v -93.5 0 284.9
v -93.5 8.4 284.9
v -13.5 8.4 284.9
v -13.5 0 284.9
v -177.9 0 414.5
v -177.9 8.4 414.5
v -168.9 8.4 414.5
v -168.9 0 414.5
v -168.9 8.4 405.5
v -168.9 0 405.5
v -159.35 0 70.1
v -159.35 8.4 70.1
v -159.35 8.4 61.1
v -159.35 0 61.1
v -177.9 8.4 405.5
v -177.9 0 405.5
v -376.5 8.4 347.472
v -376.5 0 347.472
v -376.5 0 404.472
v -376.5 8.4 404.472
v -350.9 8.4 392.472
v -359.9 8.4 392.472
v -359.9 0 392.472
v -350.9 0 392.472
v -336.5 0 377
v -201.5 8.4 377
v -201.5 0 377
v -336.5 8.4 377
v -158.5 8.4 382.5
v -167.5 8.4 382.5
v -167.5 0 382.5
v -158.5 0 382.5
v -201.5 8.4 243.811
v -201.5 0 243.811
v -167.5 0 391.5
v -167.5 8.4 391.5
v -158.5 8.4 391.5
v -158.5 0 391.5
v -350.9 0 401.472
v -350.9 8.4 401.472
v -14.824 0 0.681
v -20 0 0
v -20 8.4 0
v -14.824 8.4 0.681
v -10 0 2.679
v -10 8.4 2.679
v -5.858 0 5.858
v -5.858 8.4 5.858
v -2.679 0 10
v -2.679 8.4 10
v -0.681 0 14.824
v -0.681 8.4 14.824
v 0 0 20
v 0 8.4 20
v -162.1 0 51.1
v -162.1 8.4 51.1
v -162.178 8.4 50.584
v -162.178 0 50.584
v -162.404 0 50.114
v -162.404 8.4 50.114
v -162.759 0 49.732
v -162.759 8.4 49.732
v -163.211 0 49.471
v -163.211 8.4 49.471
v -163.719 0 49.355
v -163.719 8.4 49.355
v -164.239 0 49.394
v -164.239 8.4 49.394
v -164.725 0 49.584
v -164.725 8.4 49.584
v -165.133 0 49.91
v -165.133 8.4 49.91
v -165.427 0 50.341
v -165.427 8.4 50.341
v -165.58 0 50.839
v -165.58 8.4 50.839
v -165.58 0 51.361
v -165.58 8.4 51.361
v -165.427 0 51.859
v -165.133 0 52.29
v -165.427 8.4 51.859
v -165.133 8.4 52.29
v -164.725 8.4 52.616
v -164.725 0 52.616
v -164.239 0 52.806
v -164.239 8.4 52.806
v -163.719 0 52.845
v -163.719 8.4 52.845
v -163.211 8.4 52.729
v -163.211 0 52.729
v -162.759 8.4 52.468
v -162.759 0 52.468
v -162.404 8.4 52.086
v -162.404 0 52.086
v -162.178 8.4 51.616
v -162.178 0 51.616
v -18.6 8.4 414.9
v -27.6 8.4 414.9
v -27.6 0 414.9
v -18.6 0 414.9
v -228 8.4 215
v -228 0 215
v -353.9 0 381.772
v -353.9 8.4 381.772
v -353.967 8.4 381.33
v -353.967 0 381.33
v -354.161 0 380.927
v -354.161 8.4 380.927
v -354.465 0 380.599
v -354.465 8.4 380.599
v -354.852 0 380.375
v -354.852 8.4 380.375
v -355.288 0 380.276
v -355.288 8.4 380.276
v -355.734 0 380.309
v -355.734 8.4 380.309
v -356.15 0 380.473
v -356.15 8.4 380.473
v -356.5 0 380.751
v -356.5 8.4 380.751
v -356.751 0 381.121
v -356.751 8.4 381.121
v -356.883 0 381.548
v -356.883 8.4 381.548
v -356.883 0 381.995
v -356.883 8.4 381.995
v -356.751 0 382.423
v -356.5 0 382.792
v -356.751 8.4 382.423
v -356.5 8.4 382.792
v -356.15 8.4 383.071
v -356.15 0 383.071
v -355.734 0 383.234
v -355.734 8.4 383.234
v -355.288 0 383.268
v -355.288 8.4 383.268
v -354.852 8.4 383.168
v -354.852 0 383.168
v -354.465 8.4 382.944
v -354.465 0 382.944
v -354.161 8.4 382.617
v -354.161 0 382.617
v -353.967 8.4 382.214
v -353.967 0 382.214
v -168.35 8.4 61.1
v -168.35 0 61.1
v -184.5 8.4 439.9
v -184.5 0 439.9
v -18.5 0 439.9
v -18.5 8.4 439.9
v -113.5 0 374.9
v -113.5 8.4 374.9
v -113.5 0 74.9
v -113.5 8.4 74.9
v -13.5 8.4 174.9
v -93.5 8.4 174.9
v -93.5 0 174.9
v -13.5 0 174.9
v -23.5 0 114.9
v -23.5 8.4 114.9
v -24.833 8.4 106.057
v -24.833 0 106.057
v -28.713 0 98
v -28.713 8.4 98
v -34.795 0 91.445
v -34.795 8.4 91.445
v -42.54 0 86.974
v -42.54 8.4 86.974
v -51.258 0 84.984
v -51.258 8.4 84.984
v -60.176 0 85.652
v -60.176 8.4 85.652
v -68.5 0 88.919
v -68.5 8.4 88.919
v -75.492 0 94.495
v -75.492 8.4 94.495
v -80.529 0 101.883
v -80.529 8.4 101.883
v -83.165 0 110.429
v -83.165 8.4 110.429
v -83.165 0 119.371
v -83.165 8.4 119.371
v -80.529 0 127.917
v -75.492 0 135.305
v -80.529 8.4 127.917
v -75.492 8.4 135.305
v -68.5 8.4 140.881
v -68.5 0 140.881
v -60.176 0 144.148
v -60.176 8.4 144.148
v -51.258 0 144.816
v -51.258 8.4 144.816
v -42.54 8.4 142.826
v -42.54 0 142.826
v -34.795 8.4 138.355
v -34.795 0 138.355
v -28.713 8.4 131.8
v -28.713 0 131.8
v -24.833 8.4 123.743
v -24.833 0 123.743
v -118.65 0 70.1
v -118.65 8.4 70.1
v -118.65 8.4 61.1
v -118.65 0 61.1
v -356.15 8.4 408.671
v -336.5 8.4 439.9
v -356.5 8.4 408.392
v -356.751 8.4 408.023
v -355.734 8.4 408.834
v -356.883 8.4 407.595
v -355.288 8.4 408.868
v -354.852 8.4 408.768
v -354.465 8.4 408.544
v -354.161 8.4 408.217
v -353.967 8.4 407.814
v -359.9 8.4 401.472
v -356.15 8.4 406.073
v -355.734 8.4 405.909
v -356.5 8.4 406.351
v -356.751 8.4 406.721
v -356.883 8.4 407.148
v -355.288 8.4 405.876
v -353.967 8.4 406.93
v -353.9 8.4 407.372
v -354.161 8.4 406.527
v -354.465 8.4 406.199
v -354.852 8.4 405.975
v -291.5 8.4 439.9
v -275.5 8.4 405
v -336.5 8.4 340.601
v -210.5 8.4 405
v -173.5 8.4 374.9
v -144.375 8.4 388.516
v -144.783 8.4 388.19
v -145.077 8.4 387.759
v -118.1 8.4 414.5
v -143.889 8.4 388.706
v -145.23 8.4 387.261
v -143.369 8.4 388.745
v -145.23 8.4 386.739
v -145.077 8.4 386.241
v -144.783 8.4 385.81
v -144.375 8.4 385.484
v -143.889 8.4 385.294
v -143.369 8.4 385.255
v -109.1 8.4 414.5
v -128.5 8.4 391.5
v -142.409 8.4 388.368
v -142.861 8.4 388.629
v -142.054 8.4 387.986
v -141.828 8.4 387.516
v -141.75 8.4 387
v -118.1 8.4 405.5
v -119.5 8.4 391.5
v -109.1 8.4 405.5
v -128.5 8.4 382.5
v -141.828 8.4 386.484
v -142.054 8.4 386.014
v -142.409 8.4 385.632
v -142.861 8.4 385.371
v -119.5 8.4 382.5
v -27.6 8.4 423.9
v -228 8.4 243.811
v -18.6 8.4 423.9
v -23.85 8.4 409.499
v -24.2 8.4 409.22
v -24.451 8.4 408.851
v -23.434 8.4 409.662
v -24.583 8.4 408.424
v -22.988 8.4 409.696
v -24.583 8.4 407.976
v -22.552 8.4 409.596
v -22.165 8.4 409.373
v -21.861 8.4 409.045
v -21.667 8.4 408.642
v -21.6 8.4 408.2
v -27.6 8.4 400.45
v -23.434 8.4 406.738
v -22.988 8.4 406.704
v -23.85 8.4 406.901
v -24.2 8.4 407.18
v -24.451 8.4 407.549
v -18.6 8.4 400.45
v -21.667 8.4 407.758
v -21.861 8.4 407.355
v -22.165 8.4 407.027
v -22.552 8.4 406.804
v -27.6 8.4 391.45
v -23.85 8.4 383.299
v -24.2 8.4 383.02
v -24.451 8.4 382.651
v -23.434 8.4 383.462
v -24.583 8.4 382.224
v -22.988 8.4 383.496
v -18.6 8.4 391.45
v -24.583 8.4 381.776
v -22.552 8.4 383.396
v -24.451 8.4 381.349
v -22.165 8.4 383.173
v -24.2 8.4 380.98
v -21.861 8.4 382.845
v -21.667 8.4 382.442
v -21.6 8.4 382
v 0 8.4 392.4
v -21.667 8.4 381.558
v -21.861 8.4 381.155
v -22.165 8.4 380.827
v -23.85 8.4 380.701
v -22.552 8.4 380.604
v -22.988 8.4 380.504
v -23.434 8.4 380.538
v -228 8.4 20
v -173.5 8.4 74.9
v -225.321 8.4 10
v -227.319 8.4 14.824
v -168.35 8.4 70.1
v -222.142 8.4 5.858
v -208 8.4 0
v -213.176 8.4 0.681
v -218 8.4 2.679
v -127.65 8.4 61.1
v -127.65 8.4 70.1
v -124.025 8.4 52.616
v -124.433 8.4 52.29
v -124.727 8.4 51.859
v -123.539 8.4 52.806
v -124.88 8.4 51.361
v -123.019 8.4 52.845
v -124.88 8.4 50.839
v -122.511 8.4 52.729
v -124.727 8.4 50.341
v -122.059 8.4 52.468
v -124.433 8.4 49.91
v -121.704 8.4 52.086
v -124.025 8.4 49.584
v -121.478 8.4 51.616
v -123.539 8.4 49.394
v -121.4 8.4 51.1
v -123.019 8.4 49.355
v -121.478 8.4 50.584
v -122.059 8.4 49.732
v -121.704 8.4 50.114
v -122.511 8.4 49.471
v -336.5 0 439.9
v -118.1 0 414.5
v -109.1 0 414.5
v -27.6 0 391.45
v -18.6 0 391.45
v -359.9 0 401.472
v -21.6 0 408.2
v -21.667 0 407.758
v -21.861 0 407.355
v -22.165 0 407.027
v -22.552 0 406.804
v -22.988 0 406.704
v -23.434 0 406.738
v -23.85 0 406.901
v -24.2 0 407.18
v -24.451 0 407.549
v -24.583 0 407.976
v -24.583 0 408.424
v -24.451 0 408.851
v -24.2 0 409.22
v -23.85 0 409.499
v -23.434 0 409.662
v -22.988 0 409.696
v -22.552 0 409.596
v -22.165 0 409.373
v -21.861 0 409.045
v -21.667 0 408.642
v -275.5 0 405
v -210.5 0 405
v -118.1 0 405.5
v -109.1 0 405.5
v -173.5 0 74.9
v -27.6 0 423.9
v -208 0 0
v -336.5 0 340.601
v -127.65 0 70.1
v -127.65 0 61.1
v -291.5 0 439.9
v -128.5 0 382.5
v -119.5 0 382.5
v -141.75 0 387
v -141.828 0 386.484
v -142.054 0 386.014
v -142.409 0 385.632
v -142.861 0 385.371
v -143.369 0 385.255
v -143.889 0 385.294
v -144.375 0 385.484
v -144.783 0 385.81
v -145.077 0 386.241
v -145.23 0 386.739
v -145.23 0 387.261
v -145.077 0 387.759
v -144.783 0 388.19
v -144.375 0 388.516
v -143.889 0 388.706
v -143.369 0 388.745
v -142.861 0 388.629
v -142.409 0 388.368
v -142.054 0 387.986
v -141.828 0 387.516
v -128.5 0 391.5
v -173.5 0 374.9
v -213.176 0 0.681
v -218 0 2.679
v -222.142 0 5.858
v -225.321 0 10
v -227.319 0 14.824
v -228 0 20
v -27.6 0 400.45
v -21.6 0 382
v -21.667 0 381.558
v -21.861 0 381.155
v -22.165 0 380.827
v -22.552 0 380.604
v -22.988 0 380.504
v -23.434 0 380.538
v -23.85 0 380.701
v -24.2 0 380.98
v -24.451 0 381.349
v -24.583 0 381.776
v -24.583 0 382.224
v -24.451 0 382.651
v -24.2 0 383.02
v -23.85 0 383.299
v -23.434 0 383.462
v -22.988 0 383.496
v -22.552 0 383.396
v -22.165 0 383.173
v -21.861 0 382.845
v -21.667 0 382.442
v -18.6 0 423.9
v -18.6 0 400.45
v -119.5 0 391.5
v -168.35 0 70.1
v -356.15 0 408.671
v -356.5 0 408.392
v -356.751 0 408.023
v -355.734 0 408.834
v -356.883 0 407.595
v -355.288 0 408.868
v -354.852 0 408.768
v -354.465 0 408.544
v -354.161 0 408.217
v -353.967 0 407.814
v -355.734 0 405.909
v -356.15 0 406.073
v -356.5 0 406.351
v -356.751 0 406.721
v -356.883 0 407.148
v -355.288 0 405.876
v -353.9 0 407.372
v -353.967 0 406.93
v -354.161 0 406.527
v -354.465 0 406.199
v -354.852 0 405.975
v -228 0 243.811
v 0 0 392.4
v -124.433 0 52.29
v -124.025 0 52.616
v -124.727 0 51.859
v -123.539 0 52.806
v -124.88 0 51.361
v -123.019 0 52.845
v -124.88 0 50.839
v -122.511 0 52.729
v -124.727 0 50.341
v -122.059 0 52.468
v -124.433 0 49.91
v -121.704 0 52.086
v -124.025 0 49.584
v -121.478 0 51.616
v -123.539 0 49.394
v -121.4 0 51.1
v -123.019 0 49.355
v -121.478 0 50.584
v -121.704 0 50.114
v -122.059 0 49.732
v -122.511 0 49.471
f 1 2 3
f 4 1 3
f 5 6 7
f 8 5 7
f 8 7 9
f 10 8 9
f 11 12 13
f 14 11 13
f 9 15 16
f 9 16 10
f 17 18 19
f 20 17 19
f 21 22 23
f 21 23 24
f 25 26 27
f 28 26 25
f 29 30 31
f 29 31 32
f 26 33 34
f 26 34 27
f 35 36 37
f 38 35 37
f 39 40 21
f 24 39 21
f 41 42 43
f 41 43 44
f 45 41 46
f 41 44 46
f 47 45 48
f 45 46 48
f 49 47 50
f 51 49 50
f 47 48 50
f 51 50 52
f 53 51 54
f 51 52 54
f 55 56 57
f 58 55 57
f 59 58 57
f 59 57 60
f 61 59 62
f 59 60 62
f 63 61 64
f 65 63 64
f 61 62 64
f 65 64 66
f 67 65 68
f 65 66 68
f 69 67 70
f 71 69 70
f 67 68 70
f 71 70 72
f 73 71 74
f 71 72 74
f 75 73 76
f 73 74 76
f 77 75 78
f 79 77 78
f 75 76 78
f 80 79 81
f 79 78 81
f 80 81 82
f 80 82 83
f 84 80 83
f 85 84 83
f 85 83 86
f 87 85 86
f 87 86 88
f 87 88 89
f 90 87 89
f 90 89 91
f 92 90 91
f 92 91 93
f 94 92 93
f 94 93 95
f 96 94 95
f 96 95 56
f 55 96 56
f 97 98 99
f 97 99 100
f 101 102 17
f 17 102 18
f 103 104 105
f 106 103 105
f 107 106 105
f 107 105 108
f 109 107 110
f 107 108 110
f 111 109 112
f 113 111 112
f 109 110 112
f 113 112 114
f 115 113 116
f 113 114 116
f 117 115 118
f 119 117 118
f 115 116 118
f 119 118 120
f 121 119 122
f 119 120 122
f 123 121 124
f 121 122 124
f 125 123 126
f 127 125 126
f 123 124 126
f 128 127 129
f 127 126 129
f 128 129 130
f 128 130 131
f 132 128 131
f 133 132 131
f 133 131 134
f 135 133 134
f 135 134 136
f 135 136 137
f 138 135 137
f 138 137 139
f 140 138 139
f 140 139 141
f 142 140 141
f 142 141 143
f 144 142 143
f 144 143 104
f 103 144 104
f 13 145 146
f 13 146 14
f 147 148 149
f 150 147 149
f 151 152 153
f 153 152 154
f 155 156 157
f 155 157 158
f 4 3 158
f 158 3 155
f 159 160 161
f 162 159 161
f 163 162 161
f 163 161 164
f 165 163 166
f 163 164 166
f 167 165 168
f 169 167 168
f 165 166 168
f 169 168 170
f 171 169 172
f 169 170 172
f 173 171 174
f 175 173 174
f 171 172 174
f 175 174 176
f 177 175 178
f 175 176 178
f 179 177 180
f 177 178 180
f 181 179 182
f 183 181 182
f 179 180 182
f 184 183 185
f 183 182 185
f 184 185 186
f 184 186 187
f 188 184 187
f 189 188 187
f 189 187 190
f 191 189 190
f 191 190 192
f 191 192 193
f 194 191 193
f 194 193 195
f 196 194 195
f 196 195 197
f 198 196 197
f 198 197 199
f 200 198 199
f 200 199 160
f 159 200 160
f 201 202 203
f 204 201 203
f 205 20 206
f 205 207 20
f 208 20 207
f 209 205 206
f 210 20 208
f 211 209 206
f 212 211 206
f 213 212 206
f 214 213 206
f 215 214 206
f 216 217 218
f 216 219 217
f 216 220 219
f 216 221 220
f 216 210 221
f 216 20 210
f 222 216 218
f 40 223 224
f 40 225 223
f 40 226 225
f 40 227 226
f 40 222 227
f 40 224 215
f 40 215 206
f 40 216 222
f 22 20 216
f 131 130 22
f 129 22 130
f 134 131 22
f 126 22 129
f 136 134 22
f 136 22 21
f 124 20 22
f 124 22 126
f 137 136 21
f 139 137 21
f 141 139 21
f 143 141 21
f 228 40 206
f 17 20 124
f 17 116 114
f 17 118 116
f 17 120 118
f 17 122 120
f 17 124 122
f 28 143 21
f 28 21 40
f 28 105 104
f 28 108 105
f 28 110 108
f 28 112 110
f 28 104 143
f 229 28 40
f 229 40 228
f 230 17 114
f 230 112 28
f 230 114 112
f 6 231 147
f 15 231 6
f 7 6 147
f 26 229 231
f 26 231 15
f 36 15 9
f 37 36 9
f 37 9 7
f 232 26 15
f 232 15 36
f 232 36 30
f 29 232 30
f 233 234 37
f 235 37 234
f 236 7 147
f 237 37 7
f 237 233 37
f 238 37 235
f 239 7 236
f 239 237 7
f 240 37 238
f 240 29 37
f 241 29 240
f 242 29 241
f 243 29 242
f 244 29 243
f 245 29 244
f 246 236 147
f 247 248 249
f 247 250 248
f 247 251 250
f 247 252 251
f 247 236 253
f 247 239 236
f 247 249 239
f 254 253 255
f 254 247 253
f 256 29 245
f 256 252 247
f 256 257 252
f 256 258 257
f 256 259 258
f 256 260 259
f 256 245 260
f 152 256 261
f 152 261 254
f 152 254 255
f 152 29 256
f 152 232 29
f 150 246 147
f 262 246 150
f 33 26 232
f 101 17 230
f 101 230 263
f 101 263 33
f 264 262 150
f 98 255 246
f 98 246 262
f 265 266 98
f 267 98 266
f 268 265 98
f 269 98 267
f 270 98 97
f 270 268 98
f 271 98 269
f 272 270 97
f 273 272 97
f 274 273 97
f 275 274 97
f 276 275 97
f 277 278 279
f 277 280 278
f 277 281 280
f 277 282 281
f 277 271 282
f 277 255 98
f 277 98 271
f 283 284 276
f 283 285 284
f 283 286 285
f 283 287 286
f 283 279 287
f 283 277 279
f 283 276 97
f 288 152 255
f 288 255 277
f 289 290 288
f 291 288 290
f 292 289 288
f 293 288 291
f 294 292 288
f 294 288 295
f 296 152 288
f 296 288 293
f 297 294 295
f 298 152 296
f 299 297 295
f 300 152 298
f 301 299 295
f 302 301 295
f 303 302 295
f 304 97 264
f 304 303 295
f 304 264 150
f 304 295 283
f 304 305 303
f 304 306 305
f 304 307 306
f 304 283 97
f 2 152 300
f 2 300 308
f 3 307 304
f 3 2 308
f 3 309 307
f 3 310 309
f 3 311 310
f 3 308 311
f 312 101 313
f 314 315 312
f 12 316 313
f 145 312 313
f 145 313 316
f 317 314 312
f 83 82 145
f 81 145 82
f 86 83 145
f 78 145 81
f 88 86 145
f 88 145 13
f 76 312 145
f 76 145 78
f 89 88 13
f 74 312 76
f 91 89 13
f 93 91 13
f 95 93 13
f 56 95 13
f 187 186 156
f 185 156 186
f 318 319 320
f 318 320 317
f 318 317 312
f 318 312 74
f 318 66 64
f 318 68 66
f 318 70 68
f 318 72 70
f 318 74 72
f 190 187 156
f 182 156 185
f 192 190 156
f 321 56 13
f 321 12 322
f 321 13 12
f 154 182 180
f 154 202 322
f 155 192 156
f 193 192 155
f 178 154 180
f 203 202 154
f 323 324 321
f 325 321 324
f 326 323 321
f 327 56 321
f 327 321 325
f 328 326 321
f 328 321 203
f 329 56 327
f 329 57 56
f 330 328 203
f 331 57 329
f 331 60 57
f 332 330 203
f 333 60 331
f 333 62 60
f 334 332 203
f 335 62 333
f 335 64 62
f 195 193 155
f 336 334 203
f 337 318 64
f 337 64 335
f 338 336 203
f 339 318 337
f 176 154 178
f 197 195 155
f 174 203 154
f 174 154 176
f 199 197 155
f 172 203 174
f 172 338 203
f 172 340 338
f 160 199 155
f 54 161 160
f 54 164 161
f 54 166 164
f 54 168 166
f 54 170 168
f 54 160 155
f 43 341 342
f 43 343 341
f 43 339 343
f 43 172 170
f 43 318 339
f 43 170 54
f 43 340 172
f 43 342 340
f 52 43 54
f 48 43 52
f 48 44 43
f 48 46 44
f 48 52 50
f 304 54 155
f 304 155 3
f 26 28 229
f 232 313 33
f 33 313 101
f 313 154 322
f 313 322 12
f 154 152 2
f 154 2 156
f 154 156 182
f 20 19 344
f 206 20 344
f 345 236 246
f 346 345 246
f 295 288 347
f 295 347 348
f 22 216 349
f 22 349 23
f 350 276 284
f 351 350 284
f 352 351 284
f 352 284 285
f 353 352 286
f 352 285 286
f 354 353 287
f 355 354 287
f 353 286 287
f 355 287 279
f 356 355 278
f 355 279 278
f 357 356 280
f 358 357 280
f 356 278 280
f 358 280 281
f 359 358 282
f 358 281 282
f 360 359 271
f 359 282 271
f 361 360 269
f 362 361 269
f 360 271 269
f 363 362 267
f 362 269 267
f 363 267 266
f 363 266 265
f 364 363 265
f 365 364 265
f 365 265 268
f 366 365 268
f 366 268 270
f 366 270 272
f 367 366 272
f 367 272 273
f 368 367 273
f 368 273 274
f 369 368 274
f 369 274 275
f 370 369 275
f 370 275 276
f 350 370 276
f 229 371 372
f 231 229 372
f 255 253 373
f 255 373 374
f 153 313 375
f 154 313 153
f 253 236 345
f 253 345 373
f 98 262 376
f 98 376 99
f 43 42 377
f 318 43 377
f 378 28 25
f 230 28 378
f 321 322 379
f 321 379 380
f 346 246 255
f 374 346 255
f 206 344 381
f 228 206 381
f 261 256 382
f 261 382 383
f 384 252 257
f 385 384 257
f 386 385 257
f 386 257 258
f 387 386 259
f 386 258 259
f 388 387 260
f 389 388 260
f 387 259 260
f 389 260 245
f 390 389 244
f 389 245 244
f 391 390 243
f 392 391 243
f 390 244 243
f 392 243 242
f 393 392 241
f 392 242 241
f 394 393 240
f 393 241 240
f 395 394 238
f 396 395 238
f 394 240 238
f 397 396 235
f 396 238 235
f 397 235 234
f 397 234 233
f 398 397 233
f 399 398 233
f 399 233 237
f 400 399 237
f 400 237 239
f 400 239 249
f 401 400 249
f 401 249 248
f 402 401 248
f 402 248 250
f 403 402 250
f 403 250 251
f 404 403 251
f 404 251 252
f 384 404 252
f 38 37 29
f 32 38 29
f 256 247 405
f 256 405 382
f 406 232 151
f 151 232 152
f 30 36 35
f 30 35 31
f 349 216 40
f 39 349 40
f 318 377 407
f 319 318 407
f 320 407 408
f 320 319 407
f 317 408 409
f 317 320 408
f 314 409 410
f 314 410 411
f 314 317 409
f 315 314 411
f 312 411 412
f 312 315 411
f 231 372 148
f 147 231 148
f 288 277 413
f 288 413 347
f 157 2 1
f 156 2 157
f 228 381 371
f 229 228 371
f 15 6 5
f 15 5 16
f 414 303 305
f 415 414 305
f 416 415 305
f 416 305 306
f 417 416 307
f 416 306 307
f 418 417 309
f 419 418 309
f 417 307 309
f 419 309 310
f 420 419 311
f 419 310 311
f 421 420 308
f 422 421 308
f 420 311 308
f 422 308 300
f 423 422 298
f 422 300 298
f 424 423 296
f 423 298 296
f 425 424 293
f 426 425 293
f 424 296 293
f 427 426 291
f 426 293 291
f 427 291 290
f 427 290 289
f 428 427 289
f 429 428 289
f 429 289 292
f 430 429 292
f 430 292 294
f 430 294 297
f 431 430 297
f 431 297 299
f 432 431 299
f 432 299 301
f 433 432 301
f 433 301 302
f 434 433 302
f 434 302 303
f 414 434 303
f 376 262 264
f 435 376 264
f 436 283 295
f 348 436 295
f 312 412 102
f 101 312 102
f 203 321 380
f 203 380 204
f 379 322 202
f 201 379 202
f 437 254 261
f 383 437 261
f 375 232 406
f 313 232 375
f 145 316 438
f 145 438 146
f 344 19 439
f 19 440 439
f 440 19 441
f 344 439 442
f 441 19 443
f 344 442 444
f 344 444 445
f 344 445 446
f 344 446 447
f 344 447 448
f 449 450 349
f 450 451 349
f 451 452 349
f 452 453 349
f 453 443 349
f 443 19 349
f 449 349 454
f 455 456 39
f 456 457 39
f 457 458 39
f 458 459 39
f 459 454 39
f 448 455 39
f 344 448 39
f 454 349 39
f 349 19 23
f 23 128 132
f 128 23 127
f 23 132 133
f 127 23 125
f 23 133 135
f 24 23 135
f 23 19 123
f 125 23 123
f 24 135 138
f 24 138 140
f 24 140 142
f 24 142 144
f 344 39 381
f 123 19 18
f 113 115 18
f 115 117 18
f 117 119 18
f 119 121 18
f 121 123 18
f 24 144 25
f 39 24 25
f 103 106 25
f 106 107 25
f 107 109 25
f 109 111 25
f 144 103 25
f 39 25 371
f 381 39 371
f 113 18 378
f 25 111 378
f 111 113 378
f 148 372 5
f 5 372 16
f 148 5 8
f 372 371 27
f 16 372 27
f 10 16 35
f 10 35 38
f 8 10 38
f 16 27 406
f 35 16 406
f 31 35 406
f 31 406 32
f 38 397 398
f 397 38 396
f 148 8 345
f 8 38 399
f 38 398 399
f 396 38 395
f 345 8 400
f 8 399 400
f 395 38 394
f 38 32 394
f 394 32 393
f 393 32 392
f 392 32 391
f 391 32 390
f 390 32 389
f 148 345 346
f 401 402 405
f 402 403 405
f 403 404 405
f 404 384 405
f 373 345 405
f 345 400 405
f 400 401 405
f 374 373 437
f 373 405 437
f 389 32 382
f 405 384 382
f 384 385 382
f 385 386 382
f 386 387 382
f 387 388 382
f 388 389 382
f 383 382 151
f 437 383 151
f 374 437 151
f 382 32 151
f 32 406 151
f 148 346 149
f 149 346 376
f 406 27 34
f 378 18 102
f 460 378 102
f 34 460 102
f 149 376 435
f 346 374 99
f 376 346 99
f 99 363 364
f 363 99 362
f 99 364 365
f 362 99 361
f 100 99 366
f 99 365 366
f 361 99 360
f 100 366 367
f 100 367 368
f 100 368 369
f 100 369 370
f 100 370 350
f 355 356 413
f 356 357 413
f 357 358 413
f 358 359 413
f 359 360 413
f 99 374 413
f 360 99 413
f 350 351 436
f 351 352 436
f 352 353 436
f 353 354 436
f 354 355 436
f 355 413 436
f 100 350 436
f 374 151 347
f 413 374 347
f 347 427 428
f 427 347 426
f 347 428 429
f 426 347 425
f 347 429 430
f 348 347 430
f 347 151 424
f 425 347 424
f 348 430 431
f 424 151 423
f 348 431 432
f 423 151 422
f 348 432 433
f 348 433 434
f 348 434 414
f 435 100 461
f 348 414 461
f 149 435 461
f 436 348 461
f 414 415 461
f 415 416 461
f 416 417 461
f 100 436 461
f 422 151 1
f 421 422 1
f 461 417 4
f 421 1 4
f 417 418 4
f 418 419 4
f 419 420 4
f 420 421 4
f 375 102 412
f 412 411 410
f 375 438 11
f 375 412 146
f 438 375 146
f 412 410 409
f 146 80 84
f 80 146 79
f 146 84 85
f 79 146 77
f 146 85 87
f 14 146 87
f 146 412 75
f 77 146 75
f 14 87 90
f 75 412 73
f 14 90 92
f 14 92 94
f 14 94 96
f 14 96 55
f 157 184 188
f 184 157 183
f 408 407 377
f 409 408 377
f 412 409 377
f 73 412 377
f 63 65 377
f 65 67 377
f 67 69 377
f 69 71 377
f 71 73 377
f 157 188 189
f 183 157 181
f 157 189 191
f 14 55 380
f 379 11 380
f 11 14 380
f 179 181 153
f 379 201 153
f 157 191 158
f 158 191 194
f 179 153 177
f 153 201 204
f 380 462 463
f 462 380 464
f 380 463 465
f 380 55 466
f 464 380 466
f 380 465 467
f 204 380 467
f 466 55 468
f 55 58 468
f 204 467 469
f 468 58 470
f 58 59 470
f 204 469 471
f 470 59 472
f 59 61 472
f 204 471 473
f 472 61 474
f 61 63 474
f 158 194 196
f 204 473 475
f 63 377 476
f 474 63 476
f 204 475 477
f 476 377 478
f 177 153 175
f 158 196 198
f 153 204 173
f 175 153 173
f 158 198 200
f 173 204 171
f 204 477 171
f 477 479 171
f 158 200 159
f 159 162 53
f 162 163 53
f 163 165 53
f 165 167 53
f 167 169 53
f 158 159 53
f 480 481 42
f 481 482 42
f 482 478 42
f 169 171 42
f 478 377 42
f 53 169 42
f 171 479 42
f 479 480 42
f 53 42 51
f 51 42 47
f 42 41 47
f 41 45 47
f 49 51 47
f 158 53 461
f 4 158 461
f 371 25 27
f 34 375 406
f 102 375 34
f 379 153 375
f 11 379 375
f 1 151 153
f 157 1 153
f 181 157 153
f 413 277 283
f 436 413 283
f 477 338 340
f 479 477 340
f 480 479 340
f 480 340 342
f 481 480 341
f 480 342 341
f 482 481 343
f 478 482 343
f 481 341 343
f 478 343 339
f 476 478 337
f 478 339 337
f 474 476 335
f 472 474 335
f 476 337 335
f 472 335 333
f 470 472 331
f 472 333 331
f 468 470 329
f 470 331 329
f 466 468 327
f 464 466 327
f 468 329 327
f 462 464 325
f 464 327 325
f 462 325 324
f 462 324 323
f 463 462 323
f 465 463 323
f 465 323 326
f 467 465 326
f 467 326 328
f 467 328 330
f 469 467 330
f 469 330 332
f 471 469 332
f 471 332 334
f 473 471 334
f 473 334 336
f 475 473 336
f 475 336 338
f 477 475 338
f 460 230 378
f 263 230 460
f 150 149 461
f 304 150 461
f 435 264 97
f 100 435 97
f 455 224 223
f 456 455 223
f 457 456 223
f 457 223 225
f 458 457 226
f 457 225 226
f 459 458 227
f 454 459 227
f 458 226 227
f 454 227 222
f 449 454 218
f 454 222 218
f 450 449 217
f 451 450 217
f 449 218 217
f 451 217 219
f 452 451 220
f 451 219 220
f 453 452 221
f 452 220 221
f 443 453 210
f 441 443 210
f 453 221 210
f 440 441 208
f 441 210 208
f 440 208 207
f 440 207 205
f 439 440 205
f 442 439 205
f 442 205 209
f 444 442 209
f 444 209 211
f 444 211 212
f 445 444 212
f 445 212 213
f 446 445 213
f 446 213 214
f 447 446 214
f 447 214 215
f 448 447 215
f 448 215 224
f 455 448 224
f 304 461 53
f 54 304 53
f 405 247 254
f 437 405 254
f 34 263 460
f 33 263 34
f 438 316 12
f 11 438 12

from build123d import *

# Parameters (mm, degrees)
BOSS_EXTRUDE1_DEPTH = 8.4
SKETCH2_R           = 1.5
SKETCH2_R_2         = 1.75
SKETCH2_W           = 60
SKETCH2_H           = 300
SKETCH2_W_2         = 9
SKETCH2_H_2         = 9
CUT_EXTRUDE1_DEPTH  = 9.4
FILLET1_R           = 20
SKETCH3_R           = 30
SKETCH3_W           = 80
SKETCH3_H           = 110
CUT_EXTRUDE2_DEPTH  = 9.4


with BuildPart() as part:
    # Sketch1 → Boss-Extrude1 (new body)
    with BuildSketch(Plane(origin=(0, 0, 0), x_dir=(1, 0, 0), z_dir=(0, 1, 0))):
        Polygon((0, 0), (-228, 0), (-228, -215), (-376.5, -347.47169509), (-376.5, -404.47169509), (-336.5, -439.9), (-291.5, -439.9), (-275.5, -405), (-210.5, -405), (-184.5, -439.9), (-18.5, -439.9), (0, -392.4), align=None)
    extrude(amount=BOSS_EXTRUDE1_DEPTH)

    # Sketch2 → Cut-Extrude1 (cut, through all)
    with BuildSketch(Plane(origin=(0, 8.4, 0), x_dir=(1, 0, 0), z_dir=(0, 1, 0))):
        with Locations((-23.1, -408.2)):
            Circle(SKETCH2_R)
        with Locations((-23.1, -382)):
            Circle(SKETCH2_R)
        with Locations((-355.4, -407.37169509)):
            Circle(SKETCH2_R)
        with Locations((-355.4, -381.77169509)):
            Circle(SKETCH2_R)
        with Locations((-163.85, -51.1)):
            Circle(SKETCH2_R_2)
        with Locations((-123.15, -51.1)):
            Circle(SKETCH2_R_2)
        with Locations((-143.5, -387)):
            Circle(SKETCH2_R_2)
        Polygon((-336.5, -340.600531429), (-228, -243.811447811), (-201.5, -243.811447811), (-201.5, -377), (-336.5, -377), align=None)
        with Locations((-143.5, -224.9)):
            Rectangle(SKETCH2_W, SKETCH2_H)
        with Locations((-23.1, -419.4)):
            Rectangle(SKETCH2_W_2, SKETCH2_H_2)
        with Locations((-23.1, -395.95)):
            Rectangle(SKETCH2_W_2, SKETCH2_H_2)
        with Locations((-355.4, -396.97169509)):
            Rectangle(SKETCH2_W_2, SKETCH2_H_2)
        with Locations((-163.85, -65.6)):
            Rectangle(SKETCH2_W_2, SKETCH2_H_2)
        with Locations((-123.15, -65.6)):
            Rectangle(SKETCH2_W_2, SKETCH2_H_2)
        with Locations((-163, -387)):
            Rectangle(SKETCH2_W_2, SKETCH2_H_2)
        with Locations((-124, -387)):
            Rectangle(SKETCH2_W_2, SKETCH2_H_2)
        with Locations((-173.4, -410)):
            Rectangle(SKETCH2_W_2, SKETCH2_H_2)
        with Locations((-113.6, -410)):
            Rectangle(SKETCH2_W_2, SKETCH2_H_2)
    extrude(amount=-CUT_EXTRUDE1_DEPTH, mode=Mode.SUBTRACT)

    # Fillet1
    fillet1_edges = [part.edges().sort_by_distance(p)[0] for p in [
        (-228, 4.2, 0),
        (0, 4.2, 0),
    ]]
    fillet(fillet1_edges, radius=FILLET1_R)

    # Sketch3 → Cut-Extrude2 (cut, through all)
    with BuildSketch(Plane(origin=(0, 8.4, 0), x_dir=(1, 0, 0), z_dir=(0, 1, 0))):
        with Locations((-53.5, -114.9)):
            Circle(SKETCH3_R)
        with Locations((-53.5, -229.9)):
            Rectangle(SKETCH3_W, SKETCH3_H)
    extrude(amount=-CUT_EXTRUDE2_DEPTH, mode=Mode.SUBTRACT)


solid = part.part
